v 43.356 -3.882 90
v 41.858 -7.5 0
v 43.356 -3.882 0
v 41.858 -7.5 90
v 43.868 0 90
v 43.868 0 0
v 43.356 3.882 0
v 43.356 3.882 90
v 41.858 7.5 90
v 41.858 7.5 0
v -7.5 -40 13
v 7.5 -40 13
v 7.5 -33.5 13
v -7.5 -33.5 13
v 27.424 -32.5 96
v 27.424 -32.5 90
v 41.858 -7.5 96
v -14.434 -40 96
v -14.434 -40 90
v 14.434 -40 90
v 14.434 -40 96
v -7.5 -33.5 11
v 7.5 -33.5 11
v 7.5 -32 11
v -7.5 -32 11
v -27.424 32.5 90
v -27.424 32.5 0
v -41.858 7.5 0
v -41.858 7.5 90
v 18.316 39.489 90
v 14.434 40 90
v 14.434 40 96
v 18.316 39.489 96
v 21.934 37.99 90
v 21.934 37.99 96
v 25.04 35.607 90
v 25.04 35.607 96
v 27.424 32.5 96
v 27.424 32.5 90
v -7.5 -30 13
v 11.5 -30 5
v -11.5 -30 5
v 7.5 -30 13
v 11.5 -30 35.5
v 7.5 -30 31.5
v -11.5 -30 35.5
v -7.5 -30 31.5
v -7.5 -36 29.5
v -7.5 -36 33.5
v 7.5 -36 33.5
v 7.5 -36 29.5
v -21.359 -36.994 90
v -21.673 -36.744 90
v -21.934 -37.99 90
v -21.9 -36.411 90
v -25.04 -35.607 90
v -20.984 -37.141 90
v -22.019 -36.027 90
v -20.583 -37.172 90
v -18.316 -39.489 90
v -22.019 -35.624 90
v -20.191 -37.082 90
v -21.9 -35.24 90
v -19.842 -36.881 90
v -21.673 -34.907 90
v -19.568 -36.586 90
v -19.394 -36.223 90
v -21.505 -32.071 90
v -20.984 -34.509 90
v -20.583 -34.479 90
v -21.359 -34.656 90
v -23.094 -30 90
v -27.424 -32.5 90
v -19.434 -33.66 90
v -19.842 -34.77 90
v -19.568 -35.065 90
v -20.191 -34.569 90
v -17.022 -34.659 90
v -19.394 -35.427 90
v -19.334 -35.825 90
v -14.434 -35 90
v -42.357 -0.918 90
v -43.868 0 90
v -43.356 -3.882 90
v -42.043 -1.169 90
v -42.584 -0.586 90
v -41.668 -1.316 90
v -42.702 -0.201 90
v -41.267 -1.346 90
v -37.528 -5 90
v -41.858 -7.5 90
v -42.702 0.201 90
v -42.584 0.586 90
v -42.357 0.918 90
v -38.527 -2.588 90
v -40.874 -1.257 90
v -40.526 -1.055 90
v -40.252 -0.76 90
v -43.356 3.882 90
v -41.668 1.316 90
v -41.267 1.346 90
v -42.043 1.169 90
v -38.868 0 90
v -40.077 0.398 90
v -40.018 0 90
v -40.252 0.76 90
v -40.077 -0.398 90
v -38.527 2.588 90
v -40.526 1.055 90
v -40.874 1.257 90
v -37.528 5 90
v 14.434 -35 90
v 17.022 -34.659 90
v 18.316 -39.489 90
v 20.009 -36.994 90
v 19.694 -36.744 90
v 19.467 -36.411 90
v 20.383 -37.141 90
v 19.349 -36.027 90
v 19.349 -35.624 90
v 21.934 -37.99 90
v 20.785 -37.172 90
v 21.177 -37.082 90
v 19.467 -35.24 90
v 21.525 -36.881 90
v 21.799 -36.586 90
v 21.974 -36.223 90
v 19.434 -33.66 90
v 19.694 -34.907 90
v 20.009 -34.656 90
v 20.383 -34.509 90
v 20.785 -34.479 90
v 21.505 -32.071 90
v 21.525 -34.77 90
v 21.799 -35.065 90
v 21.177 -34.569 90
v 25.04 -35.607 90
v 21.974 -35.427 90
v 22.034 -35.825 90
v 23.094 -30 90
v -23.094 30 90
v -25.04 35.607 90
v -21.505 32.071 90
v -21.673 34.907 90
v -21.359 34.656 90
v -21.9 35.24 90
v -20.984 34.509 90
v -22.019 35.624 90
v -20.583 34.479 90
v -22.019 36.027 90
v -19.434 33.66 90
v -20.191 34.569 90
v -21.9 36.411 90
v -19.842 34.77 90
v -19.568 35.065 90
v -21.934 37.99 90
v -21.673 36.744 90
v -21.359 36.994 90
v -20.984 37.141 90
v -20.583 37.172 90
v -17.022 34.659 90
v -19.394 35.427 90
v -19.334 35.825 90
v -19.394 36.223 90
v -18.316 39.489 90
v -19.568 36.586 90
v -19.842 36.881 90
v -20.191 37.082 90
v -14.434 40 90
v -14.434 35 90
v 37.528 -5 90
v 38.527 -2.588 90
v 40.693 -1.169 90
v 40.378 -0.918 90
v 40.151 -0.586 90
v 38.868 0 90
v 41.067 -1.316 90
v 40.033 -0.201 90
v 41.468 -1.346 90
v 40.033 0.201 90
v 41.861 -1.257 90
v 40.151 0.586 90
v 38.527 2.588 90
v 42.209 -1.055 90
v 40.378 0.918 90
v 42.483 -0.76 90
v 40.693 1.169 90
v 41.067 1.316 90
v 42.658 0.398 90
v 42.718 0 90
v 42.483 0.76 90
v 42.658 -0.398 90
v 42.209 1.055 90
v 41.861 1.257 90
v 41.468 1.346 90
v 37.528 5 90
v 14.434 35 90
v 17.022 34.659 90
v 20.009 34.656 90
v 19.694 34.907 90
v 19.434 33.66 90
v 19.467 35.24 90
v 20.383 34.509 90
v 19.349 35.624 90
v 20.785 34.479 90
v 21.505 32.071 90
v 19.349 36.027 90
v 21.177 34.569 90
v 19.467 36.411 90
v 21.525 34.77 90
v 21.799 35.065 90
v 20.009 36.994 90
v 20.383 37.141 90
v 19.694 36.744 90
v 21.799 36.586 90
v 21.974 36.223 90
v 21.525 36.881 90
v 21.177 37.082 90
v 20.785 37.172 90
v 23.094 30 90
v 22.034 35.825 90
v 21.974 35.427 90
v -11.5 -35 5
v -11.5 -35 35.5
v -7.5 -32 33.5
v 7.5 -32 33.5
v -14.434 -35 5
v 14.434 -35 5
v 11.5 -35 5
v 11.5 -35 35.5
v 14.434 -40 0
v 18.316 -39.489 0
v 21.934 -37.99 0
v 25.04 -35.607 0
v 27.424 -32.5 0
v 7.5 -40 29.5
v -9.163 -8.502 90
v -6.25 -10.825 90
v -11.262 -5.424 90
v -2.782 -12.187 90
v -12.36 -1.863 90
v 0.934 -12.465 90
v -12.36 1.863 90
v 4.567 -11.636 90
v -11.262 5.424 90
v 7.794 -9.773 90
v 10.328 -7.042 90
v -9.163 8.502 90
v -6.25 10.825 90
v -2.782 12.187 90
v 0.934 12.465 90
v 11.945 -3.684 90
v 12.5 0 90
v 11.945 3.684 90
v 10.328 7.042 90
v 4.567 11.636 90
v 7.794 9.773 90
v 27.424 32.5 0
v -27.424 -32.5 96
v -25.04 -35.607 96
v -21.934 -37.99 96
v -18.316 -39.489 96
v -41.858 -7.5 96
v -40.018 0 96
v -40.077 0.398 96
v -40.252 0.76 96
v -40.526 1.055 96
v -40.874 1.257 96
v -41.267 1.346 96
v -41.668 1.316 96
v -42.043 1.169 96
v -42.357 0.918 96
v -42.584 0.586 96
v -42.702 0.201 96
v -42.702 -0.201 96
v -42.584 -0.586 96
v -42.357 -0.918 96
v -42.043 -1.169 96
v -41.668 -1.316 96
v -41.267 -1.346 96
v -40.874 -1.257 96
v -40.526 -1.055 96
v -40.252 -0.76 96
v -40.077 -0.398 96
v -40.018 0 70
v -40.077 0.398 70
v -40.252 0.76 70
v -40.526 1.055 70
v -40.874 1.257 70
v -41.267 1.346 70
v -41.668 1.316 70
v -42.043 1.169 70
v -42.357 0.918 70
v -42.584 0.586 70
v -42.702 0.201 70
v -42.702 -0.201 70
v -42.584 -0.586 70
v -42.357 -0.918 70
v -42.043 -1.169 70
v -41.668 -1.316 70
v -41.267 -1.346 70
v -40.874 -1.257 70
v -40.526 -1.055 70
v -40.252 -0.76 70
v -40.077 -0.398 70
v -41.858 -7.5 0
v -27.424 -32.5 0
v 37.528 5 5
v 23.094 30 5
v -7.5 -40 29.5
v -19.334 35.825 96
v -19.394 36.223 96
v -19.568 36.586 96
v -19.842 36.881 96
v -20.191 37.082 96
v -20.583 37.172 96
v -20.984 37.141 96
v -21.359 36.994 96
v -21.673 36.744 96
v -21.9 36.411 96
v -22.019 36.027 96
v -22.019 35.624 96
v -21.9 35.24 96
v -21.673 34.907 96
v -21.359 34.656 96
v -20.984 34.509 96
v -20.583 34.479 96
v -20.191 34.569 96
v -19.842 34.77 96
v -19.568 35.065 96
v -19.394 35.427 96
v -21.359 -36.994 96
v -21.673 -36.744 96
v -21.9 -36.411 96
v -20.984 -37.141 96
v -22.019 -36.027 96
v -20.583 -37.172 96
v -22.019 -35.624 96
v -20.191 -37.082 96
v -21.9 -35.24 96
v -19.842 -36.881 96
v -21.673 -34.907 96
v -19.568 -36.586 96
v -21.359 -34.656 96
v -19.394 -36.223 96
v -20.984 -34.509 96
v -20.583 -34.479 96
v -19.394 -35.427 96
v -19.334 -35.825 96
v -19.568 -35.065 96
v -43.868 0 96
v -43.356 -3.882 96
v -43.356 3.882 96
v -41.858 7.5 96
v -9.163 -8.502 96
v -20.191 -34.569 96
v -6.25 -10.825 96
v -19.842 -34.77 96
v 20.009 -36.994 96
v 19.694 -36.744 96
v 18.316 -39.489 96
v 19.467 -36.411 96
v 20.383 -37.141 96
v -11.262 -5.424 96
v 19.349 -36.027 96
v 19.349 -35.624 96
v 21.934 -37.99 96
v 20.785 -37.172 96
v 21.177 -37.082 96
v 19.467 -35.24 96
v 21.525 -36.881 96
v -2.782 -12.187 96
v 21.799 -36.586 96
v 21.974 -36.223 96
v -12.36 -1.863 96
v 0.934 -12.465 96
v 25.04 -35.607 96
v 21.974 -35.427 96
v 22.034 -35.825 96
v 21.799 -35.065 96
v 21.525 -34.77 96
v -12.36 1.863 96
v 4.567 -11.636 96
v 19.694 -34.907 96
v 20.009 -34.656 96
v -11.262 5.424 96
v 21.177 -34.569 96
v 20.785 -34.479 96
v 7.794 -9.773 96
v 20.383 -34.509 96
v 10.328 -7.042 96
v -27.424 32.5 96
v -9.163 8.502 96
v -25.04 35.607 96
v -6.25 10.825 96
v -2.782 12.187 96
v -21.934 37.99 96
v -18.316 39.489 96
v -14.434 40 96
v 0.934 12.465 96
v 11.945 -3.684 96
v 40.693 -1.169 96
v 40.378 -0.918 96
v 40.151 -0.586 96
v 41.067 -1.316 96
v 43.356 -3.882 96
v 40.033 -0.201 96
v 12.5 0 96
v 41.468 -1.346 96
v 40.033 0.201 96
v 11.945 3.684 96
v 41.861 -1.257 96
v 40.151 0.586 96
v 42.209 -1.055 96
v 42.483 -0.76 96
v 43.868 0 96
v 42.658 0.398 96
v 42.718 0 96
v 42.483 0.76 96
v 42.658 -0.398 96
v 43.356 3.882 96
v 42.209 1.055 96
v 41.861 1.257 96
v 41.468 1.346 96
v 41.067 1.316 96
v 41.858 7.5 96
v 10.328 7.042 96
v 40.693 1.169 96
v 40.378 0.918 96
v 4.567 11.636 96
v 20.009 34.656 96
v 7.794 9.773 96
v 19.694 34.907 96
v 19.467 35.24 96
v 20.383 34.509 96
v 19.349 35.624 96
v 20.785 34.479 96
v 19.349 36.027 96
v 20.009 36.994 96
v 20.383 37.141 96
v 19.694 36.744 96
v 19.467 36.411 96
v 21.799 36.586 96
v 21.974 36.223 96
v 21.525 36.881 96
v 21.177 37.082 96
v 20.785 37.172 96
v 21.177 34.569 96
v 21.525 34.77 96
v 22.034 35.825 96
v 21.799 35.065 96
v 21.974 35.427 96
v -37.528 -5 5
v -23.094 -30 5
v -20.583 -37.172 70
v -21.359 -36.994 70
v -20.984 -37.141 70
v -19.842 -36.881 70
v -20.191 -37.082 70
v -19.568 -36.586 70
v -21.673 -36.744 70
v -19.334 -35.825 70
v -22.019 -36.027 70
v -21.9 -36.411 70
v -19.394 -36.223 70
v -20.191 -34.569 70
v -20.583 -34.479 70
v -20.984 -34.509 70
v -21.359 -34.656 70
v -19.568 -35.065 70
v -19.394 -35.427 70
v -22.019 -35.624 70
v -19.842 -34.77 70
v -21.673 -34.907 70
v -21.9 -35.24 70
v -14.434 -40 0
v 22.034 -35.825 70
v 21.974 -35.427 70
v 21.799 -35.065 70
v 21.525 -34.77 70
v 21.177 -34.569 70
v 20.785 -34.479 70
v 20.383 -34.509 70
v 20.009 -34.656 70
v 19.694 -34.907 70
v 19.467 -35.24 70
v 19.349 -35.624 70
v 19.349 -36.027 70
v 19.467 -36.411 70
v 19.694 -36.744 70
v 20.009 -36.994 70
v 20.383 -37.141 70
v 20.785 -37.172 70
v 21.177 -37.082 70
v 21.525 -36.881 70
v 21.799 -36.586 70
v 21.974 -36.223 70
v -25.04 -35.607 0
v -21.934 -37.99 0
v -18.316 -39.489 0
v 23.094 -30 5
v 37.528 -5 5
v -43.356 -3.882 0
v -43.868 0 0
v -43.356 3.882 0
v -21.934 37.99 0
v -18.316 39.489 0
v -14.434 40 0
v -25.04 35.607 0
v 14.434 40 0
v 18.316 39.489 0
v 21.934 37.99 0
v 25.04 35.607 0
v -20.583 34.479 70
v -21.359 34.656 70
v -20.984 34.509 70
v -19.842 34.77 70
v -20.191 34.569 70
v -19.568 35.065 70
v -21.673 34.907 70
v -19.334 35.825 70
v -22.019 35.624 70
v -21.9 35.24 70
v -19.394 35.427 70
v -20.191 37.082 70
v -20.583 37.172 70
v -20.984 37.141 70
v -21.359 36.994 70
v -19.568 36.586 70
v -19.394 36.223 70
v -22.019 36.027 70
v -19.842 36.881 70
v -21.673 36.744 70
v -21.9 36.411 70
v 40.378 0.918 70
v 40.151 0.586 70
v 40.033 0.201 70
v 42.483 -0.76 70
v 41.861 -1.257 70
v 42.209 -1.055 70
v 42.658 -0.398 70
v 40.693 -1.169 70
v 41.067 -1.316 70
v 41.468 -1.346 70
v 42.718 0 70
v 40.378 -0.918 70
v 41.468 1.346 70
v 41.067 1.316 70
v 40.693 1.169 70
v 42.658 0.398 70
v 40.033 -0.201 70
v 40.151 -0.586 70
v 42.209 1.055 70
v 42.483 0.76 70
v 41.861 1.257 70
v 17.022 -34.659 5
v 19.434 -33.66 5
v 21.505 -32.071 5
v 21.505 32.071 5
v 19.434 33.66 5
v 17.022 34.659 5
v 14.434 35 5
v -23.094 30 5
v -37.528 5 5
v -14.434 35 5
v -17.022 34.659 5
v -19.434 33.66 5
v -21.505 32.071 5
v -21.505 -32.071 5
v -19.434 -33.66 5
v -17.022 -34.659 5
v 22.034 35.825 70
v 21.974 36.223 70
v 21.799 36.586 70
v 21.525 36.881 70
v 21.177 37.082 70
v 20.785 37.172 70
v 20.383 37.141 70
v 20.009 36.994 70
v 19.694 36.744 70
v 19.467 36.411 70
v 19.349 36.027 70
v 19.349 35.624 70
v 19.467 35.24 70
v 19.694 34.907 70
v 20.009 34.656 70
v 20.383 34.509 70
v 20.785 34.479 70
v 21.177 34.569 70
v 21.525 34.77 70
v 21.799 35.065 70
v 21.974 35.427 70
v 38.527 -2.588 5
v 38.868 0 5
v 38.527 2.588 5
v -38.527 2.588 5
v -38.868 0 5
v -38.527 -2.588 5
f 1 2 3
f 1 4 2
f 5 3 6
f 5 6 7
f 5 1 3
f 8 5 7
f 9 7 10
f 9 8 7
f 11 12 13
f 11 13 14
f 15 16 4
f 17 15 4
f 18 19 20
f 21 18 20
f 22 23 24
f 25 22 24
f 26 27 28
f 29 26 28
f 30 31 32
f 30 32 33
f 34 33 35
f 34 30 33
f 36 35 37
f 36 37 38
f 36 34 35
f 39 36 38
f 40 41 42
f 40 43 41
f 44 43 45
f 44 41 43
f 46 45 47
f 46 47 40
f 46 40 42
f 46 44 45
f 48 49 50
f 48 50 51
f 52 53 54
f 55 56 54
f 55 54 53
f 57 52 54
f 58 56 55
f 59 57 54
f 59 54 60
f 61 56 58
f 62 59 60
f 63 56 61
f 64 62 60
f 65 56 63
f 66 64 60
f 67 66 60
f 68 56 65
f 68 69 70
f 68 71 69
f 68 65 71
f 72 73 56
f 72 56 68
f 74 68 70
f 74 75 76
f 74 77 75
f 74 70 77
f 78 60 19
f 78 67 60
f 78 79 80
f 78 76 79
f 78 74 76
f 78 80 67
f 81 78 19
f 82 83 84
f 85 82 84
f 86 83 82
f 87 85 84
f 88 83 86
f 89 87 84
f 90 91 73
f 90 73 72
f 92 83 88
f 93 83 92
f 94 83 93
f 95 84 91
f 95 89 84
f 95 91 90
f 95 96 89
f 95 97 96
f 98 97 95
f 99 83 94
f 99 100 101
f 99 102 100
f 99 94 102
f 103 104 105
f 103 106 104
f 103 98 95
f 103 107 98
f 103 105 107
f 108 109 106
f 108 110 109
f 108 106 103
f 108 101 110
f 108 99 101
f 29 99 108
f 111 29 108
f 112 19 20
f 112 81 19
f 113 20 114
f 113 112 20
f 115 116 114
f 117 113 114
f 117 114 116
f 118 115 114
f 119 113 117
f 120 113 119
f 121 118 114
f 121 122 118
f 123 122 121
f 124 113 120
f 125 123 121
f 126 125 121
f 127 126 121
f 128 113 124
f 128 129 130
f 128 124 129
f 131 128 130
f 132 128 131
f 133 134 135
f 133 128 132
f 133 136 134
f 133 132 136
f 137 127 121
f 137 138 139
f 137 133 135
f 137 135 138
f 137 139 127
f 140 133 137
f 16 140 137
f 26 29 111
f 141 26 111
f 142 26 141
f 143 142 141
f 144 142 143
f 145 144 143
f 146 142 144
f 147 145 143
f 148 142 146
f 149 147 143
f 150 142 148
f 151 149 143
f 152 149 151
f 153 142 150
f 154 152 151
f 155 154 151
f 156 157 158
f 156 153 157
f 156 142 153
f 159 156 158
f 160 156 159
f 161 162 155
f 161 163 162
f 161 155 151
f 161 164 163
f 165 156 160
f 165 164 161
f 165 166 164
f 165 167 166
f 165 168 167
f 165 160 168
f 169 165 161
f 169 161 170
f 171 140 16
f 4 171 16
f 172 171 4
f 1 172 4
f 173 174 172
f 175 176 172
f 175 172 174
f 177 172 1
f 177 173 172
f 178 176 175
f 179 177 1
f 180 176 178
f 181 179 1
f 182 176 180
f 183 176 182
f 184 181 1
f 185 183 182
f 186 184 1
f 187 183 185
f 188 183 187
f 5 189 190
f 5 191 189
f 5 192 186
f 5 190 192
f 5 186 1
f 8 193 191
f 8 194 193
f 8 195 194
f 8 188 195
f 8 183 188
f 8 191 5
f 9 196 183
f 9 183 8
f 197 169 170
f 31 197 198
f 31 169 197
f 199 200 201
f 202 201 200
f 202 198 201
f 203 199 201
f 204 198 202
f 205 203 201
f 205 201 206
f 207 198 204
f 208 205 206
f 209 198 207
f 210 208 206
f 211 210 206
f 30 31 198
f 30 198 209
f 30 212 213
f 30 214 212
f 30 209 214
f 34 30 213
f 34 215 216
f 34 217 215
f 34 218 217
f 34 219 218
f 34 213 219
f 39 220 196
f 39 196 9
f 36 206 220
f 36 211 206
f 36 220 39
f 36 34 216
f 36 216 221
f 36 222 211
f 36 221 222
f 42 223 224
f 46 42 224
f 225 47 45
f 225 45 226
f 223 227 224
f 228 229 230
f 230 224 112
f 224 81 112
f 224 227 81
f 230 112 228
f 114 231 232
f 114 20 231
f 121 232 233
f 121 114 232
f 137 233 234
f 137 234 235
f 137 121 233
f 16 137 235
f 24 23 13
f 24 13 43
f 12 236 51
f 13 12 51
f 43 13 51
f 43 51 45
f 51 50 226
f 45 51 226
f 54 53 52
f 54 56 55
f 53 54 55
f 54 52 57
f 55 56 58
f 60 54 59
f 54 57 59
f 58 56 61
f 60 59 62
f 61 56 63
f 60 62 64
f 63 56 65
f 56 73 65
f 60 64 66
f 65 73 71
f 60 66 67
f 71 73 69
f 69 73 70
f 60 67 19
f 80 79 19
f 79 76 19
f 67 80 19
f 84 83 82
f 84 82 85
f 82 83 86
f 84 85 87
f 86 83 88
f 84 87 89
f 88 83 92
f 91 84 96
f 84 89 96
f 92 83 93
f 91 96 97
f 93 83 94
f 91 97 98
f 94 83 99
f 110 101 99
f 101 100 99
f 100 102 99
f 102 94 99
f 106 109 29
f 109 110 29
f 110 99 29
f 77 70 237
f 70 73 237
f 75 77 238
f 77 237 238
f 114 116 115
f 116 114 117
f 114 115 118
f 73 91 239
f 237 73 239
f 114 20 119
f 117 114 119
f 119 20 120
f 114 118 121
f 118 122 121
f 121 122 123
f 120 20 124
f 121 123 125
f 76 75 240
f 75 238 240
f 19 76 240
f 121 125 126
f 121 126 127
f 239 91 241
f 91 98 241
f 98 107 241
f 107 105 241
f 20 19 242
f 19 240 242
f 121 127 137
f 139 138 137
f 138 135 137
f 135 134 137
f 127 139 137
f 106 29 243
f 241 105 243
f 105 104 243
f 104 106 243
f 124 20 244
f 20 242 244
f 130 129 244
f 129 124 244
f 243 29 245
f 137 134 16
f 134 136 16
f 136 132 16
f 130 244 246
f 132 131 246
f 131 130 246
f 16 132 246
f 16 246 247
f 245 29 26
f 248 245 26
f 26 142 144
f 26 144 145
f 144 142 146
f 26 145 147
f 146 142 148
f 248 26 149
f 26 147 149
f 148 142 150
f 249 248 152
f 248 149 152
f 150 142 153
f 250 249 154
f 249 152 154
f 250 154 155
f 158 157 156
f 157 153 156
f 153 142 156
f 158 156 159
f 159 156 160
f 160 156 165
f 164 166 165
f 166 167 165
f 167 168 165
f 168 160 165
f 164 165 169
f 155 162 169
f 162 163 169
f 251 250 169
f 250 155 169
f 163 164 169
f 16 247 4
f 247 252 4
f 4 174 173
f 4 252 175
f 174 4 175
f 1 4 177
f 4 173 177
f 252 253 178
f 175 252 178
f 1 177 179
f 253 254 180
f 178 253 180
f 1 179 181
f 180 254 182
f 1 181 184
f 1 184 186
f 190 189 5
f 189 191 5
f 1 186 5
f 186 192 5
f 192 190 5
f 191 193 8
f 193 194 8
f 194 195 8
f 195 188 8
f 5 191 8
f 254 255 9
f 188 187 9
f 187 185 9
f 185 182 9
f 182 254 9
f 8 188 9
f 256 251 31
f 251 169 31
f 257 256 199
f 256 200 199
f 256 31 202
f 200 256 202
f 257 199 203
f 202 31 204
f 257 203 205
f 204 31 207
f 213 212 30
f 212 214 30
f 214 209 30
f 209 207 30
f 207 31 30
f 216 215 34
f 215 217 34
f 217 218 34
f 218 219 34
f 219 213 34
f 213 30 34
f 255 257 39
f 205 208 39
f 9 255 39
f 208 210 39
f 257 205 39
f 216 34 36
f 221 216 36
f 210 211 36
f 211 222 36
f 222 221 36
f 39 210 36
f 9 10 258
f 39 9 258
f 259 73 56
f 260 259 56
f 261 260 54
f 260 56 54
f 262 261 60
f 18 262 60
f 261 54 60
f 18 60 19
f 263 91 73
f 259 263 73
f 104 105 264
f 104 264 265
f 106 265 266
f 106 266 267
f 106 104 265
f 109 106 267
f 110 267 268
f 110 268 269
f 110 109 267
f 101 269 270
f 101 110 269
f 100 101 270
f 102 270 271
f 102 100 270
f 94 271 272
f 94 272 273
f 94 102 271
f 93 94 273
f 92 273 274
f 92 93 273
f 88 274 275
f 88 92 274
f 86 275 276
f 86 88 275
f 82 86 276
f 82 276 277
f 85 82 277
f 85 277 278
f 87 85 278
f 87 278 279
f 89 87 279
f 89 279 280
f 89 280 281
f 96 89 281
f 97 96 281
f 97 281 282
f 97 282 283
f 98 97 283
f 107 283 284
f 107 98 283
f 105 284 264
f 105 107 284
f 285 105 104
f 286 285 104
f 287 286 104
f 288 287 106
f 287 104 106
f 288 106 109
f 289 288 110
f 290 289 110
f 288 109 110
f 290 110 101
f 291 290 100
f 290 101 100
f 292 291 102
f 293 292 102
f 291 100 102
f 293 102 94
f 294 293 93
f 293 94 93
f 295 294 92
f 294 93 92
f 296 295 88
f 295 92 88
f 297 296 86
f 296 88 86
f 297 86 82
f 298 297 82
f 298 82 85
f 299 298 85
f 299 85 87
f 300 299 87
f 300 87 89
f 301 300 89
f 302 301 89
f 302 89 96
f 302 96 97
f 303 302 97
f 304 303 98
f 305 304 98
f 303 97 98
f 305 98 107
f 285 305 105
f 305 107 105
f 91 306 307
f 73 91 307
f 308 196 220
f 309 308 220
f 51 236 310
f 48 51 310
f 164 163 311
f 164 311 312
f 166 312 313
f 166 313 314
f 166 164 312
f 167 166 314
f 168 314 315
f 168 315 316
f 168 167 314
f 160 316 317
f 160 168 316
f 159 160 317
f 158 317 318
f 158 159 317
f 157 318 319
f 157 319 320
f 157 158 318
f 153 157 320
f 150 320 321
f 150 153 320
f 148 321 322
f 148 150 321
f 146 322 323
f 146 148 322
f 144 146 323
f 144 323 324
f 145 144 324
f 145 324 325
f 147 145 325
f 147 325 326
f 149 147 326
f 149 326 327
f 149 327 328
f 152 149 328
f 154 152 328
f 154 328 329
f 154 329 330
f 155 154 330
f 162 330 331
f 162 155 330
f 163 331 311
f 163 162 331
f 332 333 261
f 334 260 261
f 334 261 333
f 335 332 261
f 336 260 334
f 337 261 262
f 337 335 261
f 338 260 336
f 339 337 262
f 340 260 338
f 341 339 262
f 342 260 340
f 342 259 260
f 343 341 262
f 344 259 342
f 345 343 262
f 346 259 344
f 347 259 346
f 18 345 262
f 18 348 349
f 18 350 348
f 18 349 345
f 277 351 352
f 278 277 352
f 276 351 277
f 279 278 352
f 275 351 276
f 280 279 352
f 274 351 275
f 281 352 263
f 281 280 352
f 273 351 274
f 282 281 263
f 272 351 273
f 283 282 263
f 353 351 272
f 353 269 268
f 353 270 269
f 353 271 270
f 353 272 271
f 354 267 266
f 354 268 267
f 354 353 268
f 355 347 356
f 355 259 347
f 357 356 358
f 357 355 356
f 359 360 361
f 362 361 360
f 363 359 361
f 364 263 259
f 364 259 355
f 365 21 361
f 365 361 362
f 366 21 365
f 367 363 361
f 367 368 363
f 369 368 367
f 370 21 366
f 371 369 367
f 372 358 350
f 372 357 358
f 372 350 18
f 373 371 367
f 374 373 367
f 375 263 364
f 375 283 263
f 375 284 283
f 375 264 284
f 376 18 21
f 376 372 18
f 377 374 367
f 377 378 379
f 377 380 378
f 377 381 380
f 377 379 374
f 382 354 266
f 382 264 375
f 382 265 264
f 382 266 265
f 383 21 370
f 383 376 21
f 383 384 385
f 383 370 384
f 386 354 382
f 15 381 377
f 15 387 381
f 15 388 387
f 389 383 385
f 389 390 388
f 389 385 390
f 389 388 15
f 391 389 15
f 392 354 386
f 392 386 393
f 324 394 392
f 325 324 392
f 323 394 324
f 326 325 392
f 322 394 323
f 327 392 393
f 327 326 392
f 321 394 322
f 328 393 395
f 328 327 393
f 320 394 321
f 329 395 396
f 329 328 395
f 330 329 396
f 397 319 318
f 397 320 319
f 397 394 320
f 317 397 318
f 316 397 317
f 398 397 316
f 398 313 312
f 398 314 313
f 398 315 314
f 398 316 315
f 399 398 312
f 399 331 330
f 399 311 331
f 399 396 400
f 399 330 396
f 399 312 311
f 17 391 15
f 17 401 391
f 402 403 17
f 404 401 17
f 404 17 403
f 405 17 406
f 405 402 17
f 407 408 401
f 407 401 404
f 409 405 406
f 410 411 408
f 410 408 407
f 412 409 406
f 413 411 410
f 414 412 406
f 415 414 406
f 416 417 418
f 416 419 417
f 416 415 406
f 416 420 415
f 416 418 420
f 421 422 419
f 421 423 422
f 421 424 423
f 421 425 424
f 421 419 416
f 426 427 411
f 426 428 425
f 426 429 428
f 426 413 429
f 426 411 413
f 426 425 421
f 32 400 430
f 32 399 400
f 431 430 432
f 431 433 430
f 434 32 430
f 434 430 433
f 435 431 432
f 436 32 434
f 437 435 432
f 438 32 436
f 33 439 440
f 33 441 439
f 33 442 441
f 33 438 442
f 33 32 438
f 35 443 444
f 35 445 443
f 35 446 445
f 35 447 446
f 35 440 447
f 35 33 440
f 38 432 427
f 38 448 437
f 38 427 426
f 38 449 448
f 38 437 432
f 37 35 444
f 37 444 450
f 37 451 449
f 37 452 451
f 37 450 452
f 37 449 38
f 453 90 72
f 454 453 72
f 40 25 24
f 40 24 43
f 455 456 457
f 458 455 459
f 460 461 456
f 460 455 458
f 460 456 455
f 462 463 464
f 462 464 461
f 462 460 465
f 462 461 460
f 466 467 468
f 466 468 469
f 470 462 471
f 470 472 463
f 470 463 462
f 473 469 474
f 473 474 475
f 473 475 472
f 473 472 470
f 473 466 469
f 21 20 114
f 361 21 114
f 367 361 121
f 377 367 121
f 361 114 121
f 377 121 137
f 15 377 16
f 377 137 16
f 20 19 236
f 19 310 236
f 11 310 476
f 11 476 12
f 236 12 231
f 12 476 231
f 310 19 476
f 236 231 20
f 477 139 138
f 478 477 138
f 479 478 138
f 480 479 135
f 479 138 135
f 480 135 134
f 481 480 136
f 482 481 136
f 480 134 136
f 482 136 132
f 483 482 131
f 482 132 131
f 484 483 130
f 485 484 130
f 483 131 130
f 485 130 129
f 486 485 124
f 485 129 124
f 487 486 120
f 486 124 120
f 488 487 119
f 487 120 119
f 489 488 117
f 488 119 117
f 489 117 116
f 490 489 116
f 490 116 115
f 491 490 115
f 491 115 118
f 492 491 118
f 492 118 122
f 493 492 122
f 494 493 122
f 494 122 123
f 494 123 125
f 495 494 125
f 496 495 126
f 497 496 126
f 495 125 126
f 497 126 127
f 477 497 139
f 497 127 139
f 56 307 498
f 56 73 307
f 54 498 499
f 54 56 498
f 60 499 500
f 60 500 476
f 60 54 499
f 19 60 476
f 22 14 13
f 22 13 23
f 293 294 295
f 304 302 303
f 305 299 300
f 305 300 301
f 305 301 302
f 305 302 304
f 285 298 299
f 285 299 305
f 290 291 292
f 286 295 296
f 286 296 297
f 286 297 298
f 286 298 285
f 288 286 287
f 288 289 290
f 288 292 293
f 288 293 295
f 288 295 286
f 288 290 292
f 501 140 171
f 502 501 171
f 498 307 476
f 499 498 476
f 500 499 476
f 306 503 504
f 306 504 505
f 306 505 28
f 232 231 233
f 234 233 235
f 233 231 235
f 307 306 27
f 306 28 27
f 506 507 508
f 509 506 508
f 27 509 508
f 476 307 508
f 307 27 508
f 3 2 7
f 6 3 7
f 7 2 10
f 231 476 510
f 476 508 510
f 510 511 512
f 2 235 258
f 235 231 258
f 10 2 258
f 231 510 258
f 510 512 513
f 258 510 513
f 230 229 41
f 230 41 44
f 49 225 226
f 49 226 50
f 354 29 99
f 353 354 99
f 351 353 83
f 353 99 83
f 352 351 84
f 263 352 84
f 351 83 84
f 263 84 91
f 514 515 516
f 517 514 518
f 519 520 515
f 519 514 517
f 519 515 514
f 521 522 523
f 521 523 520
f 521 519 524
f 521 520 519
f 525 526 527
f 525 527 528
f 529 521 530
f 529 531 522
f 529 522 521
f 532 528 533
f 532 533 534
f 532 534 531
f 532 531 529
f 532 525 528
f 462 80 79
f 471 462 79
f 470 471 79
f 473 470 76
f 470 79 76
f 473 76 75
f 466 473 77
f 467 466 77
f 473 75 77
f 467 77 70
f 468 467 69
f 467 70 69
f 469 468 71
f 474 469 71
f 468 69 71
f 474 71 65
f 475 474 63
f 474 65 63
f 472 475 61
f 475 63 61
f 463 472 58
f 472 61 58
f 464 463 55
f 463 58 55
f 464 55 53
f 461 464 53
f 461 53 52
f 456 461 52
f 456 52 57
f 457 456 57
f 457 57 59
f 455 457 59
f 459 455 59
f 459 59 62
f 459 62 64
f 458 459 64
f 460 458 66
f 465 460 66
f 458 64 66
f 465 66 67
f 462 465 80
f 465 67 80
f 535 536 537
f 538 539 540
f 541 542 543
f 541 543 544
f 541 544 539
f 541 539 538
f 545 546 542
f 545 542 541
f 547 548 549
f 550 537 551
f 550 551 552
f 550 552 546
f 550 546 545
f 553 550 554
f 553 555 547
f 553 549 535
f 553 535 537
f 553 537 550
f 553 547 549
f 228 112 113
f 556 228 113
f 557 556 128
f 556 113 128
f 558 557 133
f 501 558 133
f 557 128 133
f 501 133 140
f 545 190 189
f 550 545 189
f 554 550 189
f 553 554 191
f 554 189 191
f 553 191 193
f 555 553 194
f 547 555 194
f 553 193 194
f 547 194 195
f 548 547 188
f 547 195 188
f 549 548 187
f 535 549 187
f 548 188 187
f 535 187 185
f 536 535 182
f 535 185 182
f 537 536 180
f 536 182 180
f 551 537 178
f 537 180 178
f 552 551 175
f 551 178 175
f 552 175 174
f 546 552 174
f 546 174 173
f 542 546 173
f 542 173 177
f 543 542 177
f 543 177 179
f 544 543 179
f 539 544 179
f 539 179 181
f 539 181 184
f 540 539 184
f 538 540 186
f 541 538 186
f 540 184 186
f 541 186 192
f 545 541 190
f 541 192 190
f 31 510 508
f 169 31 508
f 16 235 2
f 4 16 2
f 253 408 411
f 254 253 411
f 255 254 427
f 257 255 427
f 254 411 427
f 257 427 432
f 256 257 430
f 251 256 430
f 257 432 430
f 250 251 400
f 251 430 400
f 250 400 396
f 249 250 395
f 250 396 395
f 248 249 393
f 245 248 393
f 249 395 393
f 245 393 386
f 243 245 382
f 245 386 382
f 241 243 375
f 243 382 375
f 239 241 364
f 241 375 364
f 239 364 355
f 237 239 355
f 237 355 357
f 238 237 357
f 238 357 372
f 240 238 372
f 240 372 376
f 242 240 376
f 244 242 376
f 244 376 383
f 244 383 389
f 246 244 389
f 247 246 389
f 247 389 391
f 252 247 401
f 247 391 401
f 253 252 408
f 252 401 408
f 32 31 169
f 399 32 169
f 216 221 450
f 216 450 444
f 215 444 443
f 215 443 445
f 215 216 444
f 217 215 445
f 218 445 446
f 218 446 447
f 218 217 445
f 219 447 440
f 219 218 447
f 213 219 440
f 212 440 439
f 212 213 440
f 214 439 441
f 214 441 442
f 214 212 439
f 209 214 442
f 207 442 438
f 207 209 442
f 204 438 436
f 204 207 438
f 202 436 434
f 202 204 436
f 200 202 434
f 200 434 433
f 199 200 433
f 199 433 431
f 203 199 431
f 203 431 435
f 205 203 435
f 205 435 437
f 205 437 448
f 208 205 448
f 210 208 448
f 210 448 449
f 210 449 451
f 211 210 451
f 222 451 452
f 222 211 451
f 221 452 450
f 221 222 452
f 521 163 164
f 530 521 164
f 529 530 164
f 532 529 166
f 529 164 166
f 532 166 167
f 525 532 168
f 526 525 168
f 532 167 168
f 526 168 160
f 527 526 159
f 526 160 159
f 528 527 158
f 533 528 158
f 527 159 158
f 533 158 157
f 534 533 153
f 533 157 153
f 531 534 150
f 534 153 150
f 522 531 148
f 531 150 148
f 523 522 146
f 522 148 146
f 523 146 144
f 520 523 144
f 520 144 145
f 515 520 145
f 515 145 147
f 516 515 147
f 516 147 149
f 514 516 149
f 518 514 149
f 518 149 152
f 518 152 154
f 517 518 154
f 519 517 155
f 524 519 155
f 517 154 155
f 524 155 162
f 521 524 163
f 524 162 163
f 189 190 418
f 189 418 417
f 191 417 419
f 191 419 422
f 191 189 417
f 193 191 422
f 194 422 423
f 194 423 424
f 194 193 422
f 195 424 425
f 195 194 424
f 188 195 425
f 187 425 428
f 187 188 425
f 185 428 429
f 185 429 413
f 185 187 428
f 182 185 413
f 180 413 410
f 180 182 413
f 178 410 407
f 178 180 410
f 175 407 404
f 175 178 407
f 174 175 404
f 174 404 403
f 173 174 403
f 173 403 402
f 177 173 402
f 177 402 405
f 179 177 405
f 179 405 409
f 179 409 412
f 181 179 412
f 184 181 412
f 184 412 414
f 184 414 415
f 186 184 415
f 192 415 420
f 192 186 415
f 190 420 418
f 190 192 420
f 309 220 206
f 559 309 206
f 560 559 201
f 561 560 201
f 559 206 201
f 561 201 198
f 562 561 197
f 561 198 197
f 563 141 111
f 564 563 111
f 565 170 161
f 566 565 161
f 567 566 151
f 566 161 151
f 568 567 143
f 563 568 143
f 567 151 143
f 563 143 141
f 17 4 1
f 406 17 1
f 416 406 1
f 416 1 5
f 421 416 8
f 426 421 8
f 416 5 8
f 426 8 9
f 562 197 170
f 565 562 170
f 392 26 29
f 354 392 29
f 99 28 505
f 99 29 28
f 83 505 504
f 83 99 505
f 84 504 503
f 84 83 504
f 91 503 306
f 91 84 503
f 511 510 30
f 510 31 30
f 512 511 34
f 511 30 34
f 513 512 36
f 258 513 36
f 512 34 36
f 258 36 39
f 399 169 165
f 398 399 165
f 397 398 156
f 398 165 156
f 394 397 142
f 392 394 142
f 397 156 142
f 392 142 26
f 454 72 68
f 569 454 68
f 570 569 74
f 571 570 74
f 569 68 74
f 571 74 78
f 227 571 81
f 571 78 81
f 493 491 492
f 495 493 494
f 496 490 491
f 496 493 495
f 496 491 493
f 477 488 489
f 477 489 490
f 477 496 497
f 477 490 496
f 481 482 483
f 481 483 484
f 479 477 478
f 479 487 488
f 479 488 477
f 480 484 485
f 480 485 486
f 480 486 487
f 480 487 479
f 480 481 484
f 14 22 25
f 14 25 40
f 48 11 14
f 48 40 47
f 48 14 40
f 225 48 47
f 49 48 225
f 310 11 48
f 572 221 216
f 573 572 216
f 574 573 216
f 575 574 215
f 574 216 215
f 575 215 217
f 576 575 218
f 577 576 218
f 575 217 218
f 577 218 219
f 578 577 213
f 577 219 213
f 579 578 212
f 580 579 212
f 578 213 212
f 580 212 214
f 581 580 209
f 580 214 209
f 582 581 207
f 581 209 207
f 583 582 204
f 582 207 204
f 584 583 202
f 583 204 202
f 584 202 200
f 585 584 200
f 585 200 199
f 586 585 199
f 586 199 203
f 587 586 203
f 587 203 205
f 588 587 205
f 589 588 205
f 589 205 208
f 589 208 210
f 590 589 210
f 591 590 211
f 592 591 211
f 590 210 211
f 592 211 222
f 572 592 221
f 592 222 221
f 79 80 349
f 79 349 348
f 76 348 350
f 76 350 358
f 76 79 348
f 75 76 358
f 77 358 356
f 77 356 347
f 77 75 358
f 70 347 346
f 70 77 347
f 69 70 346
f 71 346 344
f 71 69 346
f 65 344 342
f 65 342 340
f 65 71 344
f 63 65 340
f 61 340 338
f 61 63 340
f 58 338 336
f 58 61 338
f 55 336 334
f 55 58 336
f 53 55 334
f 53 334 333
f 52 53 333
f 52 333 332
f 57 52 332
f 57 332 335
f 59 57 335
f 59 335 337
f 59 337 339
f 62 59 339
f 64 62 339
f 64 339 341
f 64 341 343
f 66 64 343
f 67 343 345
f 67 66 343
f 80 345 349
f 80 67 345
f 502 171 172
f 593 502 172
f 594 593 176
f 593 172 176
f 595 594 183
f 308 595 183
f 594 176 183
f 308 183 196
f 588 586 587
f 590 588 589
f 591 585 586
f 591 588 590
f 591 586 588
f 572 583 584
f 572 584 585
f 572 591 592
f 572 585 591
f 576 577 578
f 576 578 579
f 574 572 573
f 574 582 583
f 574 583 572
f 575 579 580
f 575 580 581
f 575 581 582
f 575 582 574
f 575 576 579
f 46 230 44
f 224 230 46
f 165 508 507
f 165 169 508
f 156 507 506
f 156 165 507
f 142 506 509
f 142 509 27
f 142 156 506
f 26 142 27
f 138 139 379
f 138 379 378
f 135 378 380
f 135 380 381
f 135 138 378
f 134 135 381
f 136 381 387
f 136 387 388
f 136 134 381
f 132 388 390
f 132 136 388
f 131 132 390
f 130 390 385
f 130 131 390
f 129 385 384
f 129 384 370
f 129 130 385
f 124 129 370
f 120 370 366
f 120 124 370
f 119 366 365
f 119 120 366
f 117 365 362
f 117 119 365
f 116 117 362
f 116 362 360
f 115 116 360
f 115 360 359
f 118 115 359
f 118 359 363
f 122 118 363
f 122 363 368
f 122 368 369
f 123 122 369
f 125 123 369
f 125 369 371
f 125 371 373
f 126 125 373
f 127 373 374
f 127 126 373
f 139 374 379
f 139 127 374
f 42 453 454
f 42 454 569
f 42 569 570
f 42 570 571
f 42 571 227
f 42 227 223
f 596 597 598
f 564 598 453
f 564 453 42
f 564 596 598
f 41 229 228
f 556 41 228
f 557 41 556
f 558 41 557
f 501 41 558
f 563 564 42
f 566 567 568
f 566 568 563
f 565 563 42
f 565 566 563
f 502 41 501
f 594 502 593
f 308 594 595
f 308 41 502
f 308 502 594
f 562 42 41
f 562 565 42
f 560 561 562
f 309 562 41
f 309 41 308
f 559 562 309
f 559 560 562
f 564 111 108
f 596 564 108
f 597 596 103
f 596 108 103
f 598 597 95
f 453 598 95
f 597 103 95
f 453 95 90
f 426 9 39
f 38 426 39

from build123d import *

# Parameters (mm, degrees)
F6_DEPTH  = 90
F7_R      = 15
F8_DEPTH  = 6
F10_DEPTH = 85
F11_R     = 1.35
F12_DEPTH = 20
F13_DEPTH = 6
F14_R     = 12.5
F15_DEPTH = 6
F16_W     = 15
F16_H     = 16.5
F17_DEPTH = 5
F18_W     = 23
F18_H     = 30.5
F18_W_2   = 15
F18_H_2   = 16.5
F19_DEPTH = 5
F21_DEPTH = 15


with BuildPart() as f6:
    # F5 (on Top) → F6 (new body)
    with BuildSketch(Plane.XY):
        Polygon((23.0940107676, 40), (-23.0940107676, 40), (-46.1880215352, 0), (-23.0940107676, -40), (23.0940107676, -40), (46.1880215352, 0), align=None)
    extrude(amount=F6_DEPTH)

    # F7
    f7_edges = [f6.edges().sort_by_distance(p)[0] for p in [
        (-23.094011, -40, 45),
        (-46.188022, 0, 45),
        (-23.094011, 40, 45),
        (23.094011, 40, 45),
        (46.188022, 0, 45),
        (23.094011, -40, 45),
    ]]
    fillet(f7_edges, radius=F7_R)


with BuildPart() as f8:
    # F8 (new): a face of the model
    f8_faces = [f6.part.faces().sort_by_distance(p)[0] for p in [
        (0, 0, 90),
    ]]
    extrude(f8_faces, amount=F8_DEPTH)

    # F11 (on face) → F13 (cut)
    with BuildSketch(Plane.XY.offset(90)):
        with Locations((-20.6837567297, 35.8253175473)):
            Circle(F11_R)
        with Locations((-41.3675134595, 0)):
            Circle(F11_R)
        with Locations((-20.6837567297, -35.8253175473)):
            Circle(F11_R)
        with Locations((41.3675134595, 0)):
            Circle(F11_R)
        with Locations((20.6837567297, 35.8253175473)):
            Circle(F11_R)
        with Locations((20.6837567297, -35.8253175473)):
            Circle(F11_R)
    extrude(amount=F13_DEPTH, mode=Mode.SUBTRACT)

    # F14 (on face) → F15 (cut)
    with BuildSketch(Plane.XY.offset(96)):
        Circle(F14_R)
    extrude(amount=-F15_DEPTH, mode=Mode.SUBTRACT)


with BuildPart() as f6_1:
    add(f6.part)

    # F9 (on face) → F10 (cut)
    with BuildSketch(Plane.XY.offset(90)):
        with BuildLine():
            Line((14.4337567297, 35), (-14.4337567297, 35))
            ThreePointArc((-14.4337567297, 35), (-19.4337567297, 33.6602540378), (-23.0940107676, 30))
            Line((-23.0940107676, 30), (-37.5277674973, 5))
            ThreePointArc((-37.5277674973, 5), (-38.8675134595, 0), (-37.5277674973, -5))
            Line((-37.5277674973, -5), (-23.0940107676, -30))
            ThreePointArc((-23.0940107676, -30), (-19.4337567297, -33.6602540378), (-14.4337567297, -35))
            Line((-14.4337567297, -35), (14.4337567297, -35))
            ThreePointArc((14.4337567297, -35), (19.4337567297, -33.6602540378), (23.0940107676, -30))
            Line((23.0940107676, -30), (37.5277674973, -5))
            ThreePointArc((37.5277674973, -5), (38.8675134595, 0), (37.5277674973, 5))
            Line((37.5277674973, 5), (23.0940107676, 30))
            ThreePointArc((23.0940107676, 30), (19.4337567297, 33.6602540378), (14.4337567297, 35))
        make_face()
    extrude(amount=-F10_DEPTH, mode=Mode.SUBTRACT)

    # F11 (on face) → F12 (cut)
    with BuildSketch(Plane.XY.offset(90)):
        with Locations((-41.3675134595, 0)):
            Circle(F11_R)
        with Locations((-20.6837567297, -35.8253175473)):
            Circle(F11_R)
        with Locations((20.6837567297, -35.8253175473)):
            Circle(F11_R)
        with Locations((41.3675134595, 0)):
            Circle(F11_R)
        with Locations((20.6837567297, 35.8253175473)):
            Circle(F11_R)
        with Locations((-20.6837567297, 35.8253175473)):
            Circle(F11_R)
    extrude(amount=-F12_DEPTH, mode=Mode.SUBTRACT)

    # F16 (on face) → F17 (cut, through all)
    with BuildSketch(Plane.XZ.offset(40)):
        with Locations((0, 21.25)):
            Rectangle(F16_W, F16_H)
    extrude(amount=-F17_DEPTH, mode=Mode.SUBTRACT)

    # F18 (on face) → F19 (join)
    with BuildSketch(Plane(origin=(0, -35, 0), x_dir=(-1, 0, 0), z_dir=(0, 1, 0))):
        with Locations((0, 20.25)):
            Rectangle(F18_W, F18_H)
        with Locations((0, 21.25)):
            Rectangle(F18_W_2, F18_H_2, mode=Mode.SUBTRACT)
    extrude(amount=F19_DEPTH)

    # F20 (on face) → F21 (cut, through all)
    with BuildSketch(Plane.YZ.offset(-7.5)):
        Polygon((-32, 11), (-30, 13), (-33.5, 13), (-33.5, 11), align=None)
        Polygon((-30, 31.5), (-32, 33.5), (-36, 33.5), (-36, 29.5), (-30, 29.5), align=None)
    extrude(amount=F21_DEPTH, mode=Mode.SUBTRACT)


solid = Compound([f8.part, f6_1.part])
